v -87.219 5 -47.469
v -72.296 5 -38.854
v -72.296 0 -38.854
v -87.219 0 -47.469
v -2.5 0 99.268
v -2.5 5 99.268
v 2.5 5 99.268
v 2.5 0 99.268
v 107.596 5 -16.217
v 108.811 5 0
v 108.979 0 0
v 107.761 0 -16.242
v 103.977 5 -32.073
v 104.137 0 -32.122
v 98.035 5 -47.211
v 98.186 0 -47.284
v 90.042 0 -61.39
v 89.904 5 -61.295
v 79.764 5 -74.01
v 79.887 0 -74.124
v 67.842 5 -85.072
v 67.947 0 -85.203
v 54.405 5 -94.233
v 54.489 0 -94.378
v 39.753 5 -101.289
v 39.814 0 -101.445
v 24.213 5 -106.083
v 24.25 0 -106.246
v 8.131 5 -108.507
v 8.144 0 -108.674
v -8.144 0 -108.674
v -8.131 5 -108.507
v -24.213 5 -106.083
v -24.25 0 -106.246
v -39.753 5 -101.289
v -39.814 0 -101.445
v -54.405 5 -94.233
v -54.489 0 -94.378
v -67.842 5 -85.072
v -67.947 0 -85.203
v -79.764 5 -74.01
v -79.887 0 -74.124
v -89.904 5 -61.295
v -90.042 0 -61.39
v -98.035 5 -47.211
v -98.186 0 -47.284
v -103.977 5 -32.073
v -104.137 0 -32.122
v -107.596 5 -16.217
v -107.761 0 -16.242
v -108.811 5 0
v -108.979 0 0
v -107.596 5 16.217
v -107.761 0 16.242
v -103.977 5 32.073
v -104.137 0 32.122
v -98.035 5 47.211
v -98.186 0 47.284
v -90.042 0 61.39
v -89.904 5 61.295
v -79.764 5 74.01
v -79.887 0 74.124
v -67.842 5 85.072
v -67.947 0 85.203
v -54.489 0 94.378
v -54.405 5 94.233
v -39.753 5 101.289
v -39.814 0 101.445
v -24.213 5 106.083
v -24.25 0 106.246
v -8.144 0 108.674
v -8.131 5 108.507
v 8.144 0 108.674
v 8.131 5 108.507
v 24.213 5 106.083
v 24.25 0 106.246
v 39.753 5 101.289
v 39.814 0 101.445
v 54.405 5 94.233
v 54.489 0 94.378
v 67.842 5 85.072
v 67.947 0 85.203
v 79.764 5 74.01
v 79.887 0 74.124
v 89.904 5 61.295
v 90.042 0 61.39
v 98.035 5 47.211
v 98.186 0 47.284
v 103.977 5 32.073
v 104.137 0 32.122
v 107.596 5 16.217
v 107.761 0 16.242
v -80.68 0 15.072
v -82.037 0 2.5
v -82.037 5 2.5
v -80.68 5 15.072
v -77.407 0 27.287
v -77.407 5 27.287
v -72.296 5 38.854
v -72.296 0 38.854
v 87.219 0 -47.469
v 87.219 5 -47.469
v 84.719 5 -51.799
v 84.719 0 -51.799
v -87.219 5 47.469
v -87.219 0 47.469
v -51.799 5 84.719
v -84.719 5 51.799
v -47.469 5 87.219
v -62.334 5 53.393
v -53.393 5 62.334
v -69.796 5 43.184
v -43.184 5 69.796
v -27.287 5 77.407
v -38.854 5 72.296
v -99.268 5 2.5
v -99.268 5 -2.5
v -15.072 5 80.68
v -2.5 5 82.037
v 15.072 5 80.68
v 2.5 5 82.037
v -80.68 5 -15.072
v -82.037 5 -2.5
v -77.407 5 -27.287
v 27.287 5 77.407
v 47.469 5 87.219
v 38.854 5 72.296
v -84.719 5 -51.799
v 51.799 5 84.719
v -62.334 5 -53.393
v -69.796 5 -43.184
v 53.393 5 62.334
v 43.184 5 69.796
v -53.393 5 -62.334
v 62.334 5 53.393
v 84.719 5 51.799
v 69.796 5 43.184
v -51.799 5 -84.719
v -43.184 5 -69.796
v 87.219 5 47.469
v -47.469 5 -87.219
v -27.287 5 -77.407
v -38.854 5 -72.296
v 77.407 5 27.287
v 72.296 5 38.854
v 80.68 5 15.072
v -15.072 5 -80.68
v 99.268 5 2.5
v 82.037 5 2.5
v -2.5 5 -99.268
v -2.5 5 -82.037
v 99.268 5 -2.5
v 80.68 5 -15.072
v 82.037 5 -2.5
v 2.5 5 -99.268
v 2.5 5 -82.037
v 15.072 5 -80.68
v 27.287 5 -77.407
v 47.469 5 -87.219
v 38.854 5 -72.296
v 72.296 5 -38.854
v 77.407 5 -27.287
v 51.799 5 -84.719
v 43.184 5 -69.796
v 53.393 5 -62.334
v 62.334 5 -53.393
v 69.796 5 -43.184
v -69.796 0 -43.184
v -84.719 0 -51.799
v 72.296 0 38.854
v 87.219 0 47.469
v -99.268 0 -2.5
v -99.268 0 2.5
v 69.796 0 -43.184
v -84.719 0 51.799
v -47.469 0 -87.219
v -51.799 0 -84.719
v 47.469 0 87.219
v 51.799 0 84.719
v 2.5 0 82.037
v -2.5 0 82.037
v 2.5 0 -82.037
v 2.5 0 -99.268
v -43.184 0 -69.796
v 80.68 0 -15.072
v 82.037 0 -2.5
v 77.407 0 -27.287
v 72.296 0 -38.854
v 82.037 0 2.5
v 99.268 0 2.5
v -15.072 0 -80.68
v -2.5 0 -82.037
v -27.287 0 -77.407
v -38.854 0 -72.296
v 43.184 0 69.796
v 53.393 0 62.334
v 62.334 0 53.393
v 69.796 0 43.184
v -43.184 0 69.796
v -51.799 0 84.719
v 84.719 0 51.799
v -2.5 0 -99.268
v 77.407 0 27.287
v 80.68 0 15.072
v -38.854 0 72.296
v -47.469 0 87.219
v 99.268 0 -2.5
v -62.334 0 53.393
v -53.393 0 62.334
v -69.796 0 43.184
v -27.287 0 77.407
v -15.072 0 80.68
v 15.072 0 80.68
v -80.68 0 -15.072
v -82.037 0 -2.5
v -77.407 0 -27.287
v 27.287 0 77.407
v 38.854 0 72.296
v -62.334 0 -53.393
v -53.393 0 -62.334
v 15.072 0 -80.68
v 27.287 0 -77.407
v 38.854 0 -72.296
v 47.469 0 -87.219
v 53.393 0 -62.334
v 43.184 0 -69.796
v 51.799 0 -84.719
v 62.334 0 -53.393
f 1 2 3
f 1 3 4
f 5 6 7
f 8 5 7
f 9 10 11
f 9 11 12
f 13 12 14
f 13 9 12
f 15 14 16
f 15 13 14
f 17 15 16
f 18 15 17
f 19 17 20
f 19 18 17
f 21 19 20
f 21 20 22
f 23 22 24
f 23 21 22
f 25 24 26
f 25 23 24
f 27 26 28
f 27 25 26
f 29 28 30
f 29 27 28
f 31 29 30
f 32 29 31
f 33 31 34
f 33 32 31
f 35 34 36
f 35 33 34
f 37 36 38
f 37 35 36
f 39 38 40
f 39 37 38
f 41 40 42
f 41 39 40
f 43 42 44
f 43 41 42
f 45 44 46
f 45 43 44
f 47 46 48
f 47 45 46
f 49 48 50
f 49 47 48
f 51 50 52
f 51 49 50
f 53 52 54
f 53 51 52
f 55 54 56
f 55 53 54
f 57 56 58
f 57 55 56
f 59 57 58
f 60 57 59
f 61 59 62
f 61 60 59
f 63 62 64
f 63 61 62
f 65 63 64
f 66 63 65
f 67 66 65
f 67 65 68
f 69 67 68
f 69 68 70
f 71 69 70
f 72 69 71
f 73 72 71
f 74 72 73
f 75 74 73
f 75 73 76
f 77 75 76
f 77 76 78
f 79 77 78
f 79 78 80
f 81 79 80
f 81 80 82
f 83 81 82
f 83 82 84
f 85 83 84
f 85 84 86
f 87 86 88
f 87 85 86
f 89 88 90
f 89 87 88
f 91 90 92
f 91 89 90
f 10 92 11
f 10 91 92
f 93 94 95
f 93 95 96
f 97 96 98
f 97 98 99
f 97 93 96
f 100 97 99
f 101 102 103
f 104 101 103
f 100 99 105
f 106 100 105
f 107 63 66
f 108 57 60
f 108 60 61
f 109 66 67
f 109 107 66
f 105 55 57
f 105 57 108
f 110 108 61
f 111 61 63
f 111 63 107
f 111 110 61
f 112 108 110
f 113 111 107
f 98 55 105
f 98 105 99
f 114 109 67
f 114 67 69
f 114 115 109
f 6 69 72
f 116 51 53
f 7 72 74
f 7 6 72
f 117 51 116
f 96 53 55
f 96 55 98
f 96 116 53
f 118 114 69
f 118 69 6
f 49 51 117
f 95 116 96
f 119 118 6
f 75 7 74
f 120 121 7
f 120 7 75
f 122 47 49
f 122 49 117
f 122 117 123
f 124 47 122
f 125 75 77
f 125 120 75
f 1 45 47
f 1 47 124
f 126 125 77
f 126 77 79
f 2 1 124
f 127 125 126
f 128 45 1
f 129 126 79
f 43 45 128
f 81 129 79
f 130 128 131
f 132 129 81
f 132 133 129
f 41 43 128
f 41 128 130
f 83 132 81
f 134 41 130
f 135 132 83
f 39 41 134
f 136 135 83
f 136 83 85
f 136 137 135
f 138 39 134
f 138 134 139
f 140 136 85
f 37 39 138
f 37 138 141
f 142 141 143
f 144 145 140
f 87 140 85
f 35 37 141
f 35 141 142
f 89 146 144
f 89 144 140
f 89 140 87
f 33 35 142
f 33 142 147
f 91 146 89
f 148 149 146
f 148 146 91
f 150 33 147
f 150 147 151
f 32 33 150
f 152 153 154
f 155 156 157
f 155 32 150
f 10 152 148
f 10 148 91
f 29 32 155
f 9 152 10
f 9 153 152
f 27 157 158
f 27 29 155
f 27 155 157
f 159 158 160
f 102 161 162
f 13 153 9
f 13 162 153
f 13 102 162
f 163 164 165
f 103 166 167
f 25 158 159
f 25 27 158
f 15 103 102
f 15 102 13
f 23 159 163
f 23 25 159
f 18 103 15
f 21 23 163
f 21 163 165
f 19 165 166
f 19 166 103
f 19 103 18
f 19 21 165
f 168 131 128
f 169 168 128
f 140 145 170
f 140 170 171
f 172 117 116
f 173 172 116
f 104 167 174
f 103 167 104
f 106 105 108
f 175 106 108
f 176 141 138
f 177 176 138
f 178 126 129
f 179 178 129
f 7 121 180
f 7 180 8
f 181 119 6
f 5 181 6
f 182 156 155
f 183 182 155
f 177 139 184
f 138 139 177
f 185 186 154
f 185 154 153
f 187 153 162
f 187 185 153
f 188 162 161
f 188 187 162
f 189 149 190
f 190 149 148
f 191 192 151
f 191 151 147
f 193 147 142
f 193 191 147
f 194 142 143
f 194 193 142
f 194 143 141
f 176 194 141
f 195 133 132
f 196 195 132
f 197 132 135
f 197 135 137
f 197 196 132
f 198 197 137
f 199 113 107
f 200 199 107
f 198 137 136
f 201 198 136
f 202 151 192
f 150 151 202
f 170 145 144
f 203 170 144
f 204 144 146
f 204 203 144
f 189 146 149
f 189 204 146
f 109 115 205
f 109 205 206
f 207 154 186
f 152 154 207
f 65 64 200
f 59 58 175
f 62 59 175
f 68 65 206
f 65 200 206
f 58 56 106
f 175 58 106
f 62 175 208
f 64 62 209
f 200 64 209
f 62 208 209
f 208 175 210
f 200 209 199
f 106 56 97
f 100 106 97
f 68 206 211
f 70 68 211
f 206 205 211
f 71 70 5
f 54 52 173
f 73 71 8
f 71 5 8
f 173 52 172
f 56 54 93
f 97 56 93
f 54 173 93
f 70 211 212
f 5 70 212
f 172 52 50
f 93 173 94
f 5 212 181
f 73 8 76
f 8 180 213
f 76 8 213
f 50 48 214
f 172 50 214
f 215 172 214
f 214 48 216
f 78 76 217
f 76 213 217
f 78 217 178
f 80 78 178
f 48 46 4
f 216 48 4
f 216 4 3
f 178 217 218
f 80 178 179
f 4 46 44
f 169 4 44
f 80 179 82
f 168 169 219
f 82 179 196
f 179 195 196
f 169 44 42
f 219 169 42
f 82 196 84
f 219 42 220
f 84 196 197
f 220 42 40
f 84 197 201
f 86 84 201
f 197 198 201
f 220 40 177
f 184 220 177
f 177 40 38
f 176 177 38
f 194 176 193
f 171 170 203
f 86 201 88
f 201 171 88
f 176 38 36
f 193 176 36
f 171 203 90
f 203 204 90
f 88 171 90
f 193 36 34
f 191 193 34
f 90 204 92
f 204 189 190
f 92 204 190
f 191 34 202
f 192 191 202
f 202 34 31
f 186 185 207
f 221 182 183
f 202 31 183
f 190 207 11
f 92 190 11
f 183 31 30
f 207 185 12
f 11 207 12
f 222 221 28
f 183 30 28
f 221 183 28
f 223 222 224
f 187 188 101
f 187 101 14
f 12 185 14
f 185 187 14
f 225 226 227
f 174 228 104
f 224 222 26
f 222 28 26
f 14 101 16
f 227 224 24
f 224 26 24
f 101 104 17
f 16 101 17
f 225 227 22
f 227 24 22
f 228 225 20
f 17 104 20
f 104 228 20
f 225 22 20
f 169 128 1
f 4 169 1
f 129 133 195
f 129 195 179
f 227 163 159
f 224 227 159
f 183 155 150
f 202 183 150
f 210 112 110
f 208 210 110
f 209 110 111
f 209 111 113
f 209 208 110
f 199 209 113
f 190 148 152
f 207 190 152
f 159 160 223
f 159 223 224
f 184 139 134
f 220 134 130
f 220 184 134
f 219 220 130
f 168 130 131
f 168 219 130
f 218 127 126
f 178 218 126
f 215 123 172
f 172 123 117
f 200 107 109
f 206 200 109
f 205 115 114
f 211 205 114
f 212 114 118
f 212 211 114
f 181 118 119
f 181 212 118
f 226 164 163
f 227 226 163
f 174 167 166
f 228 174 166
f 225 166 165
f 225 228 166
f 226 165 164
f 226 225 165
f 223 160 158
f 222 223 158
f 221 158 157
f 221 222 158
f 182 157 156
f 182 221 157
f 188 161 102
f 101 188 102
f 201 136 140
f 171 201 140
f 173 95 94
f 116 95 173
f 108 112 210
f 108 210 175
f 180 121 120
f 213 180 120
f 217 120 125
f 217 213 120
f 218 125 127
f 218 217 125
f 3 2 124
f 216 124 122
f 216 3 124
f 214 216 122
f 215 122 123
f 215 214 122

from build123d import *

# Parameters (mm, degrees)
SKETCH1_R           = 108.978645108
SKETCH1_R_2         = 82.075459911
BOSS_EXTRUDE1_DEPTH = 5
SKETCH3_W           = 27.601566605
SKETCH3_H           = 5
CUT_EXTRUDE1_DEPTH  = 5
CIRPATTERN1_COUNT   = 12


with BuildPart() as part:
    # Sketch1 → Boss-Extrude1 (new body)
    with BuildSketch(Plane(origin=(0, 0, 0), x_dir=(1, 0, 0), z_dir=(0, 1, 0))):
        Circle(SKETCH1_R)
        Circle(SKETCH1_R_2, mode=Mode.SUBTRACT)
    extrude(amount=BOSS_EXTRUDE1_DEPTH)

    # Sketch2 → Cut-Revolve1 (revolve, cut)
    with BuildSketch(Plane.XY):
        Polygon((108.978645108, 0), (108.468178891, 15.211545536), (125.564128825, 15.211545536), (125.564128825, 0), align=None)
    revolve(axis=Axis((0, 0, 0), (0, 1, 0)), mode=Mode.SUBTRACT)

    # Sketch3 → Cut-Extrude1 (cut)
    with BuildSketch(Plane(origin=(0, 5, 0), x_dir=(1, 0, 0), z_dir=(0, 1, 0))):
        with Locations((85.467576893, 0)):
            Rectangle(SKETCH3_W, SKETCH3_H)
    cut_extrude1 = extrude(amount=-CUT_EXTRUDE1_DEPTH, mode=Mode.SUBTRACT)

    # CirPattern1: Cut-Extrude1 ×12 about axis
    cirpattern1_axis = Axis((0, 0, 0), (0, 1, 0))
    for i in range(1, CIRPATTERN1_COUNT):
        add(cut_extrude1.rotate(cirpattern1_axis, i * 360 / CIRPATTERN1_COUNT), mode=Mode.SUBTRACT)


solid = part.part
